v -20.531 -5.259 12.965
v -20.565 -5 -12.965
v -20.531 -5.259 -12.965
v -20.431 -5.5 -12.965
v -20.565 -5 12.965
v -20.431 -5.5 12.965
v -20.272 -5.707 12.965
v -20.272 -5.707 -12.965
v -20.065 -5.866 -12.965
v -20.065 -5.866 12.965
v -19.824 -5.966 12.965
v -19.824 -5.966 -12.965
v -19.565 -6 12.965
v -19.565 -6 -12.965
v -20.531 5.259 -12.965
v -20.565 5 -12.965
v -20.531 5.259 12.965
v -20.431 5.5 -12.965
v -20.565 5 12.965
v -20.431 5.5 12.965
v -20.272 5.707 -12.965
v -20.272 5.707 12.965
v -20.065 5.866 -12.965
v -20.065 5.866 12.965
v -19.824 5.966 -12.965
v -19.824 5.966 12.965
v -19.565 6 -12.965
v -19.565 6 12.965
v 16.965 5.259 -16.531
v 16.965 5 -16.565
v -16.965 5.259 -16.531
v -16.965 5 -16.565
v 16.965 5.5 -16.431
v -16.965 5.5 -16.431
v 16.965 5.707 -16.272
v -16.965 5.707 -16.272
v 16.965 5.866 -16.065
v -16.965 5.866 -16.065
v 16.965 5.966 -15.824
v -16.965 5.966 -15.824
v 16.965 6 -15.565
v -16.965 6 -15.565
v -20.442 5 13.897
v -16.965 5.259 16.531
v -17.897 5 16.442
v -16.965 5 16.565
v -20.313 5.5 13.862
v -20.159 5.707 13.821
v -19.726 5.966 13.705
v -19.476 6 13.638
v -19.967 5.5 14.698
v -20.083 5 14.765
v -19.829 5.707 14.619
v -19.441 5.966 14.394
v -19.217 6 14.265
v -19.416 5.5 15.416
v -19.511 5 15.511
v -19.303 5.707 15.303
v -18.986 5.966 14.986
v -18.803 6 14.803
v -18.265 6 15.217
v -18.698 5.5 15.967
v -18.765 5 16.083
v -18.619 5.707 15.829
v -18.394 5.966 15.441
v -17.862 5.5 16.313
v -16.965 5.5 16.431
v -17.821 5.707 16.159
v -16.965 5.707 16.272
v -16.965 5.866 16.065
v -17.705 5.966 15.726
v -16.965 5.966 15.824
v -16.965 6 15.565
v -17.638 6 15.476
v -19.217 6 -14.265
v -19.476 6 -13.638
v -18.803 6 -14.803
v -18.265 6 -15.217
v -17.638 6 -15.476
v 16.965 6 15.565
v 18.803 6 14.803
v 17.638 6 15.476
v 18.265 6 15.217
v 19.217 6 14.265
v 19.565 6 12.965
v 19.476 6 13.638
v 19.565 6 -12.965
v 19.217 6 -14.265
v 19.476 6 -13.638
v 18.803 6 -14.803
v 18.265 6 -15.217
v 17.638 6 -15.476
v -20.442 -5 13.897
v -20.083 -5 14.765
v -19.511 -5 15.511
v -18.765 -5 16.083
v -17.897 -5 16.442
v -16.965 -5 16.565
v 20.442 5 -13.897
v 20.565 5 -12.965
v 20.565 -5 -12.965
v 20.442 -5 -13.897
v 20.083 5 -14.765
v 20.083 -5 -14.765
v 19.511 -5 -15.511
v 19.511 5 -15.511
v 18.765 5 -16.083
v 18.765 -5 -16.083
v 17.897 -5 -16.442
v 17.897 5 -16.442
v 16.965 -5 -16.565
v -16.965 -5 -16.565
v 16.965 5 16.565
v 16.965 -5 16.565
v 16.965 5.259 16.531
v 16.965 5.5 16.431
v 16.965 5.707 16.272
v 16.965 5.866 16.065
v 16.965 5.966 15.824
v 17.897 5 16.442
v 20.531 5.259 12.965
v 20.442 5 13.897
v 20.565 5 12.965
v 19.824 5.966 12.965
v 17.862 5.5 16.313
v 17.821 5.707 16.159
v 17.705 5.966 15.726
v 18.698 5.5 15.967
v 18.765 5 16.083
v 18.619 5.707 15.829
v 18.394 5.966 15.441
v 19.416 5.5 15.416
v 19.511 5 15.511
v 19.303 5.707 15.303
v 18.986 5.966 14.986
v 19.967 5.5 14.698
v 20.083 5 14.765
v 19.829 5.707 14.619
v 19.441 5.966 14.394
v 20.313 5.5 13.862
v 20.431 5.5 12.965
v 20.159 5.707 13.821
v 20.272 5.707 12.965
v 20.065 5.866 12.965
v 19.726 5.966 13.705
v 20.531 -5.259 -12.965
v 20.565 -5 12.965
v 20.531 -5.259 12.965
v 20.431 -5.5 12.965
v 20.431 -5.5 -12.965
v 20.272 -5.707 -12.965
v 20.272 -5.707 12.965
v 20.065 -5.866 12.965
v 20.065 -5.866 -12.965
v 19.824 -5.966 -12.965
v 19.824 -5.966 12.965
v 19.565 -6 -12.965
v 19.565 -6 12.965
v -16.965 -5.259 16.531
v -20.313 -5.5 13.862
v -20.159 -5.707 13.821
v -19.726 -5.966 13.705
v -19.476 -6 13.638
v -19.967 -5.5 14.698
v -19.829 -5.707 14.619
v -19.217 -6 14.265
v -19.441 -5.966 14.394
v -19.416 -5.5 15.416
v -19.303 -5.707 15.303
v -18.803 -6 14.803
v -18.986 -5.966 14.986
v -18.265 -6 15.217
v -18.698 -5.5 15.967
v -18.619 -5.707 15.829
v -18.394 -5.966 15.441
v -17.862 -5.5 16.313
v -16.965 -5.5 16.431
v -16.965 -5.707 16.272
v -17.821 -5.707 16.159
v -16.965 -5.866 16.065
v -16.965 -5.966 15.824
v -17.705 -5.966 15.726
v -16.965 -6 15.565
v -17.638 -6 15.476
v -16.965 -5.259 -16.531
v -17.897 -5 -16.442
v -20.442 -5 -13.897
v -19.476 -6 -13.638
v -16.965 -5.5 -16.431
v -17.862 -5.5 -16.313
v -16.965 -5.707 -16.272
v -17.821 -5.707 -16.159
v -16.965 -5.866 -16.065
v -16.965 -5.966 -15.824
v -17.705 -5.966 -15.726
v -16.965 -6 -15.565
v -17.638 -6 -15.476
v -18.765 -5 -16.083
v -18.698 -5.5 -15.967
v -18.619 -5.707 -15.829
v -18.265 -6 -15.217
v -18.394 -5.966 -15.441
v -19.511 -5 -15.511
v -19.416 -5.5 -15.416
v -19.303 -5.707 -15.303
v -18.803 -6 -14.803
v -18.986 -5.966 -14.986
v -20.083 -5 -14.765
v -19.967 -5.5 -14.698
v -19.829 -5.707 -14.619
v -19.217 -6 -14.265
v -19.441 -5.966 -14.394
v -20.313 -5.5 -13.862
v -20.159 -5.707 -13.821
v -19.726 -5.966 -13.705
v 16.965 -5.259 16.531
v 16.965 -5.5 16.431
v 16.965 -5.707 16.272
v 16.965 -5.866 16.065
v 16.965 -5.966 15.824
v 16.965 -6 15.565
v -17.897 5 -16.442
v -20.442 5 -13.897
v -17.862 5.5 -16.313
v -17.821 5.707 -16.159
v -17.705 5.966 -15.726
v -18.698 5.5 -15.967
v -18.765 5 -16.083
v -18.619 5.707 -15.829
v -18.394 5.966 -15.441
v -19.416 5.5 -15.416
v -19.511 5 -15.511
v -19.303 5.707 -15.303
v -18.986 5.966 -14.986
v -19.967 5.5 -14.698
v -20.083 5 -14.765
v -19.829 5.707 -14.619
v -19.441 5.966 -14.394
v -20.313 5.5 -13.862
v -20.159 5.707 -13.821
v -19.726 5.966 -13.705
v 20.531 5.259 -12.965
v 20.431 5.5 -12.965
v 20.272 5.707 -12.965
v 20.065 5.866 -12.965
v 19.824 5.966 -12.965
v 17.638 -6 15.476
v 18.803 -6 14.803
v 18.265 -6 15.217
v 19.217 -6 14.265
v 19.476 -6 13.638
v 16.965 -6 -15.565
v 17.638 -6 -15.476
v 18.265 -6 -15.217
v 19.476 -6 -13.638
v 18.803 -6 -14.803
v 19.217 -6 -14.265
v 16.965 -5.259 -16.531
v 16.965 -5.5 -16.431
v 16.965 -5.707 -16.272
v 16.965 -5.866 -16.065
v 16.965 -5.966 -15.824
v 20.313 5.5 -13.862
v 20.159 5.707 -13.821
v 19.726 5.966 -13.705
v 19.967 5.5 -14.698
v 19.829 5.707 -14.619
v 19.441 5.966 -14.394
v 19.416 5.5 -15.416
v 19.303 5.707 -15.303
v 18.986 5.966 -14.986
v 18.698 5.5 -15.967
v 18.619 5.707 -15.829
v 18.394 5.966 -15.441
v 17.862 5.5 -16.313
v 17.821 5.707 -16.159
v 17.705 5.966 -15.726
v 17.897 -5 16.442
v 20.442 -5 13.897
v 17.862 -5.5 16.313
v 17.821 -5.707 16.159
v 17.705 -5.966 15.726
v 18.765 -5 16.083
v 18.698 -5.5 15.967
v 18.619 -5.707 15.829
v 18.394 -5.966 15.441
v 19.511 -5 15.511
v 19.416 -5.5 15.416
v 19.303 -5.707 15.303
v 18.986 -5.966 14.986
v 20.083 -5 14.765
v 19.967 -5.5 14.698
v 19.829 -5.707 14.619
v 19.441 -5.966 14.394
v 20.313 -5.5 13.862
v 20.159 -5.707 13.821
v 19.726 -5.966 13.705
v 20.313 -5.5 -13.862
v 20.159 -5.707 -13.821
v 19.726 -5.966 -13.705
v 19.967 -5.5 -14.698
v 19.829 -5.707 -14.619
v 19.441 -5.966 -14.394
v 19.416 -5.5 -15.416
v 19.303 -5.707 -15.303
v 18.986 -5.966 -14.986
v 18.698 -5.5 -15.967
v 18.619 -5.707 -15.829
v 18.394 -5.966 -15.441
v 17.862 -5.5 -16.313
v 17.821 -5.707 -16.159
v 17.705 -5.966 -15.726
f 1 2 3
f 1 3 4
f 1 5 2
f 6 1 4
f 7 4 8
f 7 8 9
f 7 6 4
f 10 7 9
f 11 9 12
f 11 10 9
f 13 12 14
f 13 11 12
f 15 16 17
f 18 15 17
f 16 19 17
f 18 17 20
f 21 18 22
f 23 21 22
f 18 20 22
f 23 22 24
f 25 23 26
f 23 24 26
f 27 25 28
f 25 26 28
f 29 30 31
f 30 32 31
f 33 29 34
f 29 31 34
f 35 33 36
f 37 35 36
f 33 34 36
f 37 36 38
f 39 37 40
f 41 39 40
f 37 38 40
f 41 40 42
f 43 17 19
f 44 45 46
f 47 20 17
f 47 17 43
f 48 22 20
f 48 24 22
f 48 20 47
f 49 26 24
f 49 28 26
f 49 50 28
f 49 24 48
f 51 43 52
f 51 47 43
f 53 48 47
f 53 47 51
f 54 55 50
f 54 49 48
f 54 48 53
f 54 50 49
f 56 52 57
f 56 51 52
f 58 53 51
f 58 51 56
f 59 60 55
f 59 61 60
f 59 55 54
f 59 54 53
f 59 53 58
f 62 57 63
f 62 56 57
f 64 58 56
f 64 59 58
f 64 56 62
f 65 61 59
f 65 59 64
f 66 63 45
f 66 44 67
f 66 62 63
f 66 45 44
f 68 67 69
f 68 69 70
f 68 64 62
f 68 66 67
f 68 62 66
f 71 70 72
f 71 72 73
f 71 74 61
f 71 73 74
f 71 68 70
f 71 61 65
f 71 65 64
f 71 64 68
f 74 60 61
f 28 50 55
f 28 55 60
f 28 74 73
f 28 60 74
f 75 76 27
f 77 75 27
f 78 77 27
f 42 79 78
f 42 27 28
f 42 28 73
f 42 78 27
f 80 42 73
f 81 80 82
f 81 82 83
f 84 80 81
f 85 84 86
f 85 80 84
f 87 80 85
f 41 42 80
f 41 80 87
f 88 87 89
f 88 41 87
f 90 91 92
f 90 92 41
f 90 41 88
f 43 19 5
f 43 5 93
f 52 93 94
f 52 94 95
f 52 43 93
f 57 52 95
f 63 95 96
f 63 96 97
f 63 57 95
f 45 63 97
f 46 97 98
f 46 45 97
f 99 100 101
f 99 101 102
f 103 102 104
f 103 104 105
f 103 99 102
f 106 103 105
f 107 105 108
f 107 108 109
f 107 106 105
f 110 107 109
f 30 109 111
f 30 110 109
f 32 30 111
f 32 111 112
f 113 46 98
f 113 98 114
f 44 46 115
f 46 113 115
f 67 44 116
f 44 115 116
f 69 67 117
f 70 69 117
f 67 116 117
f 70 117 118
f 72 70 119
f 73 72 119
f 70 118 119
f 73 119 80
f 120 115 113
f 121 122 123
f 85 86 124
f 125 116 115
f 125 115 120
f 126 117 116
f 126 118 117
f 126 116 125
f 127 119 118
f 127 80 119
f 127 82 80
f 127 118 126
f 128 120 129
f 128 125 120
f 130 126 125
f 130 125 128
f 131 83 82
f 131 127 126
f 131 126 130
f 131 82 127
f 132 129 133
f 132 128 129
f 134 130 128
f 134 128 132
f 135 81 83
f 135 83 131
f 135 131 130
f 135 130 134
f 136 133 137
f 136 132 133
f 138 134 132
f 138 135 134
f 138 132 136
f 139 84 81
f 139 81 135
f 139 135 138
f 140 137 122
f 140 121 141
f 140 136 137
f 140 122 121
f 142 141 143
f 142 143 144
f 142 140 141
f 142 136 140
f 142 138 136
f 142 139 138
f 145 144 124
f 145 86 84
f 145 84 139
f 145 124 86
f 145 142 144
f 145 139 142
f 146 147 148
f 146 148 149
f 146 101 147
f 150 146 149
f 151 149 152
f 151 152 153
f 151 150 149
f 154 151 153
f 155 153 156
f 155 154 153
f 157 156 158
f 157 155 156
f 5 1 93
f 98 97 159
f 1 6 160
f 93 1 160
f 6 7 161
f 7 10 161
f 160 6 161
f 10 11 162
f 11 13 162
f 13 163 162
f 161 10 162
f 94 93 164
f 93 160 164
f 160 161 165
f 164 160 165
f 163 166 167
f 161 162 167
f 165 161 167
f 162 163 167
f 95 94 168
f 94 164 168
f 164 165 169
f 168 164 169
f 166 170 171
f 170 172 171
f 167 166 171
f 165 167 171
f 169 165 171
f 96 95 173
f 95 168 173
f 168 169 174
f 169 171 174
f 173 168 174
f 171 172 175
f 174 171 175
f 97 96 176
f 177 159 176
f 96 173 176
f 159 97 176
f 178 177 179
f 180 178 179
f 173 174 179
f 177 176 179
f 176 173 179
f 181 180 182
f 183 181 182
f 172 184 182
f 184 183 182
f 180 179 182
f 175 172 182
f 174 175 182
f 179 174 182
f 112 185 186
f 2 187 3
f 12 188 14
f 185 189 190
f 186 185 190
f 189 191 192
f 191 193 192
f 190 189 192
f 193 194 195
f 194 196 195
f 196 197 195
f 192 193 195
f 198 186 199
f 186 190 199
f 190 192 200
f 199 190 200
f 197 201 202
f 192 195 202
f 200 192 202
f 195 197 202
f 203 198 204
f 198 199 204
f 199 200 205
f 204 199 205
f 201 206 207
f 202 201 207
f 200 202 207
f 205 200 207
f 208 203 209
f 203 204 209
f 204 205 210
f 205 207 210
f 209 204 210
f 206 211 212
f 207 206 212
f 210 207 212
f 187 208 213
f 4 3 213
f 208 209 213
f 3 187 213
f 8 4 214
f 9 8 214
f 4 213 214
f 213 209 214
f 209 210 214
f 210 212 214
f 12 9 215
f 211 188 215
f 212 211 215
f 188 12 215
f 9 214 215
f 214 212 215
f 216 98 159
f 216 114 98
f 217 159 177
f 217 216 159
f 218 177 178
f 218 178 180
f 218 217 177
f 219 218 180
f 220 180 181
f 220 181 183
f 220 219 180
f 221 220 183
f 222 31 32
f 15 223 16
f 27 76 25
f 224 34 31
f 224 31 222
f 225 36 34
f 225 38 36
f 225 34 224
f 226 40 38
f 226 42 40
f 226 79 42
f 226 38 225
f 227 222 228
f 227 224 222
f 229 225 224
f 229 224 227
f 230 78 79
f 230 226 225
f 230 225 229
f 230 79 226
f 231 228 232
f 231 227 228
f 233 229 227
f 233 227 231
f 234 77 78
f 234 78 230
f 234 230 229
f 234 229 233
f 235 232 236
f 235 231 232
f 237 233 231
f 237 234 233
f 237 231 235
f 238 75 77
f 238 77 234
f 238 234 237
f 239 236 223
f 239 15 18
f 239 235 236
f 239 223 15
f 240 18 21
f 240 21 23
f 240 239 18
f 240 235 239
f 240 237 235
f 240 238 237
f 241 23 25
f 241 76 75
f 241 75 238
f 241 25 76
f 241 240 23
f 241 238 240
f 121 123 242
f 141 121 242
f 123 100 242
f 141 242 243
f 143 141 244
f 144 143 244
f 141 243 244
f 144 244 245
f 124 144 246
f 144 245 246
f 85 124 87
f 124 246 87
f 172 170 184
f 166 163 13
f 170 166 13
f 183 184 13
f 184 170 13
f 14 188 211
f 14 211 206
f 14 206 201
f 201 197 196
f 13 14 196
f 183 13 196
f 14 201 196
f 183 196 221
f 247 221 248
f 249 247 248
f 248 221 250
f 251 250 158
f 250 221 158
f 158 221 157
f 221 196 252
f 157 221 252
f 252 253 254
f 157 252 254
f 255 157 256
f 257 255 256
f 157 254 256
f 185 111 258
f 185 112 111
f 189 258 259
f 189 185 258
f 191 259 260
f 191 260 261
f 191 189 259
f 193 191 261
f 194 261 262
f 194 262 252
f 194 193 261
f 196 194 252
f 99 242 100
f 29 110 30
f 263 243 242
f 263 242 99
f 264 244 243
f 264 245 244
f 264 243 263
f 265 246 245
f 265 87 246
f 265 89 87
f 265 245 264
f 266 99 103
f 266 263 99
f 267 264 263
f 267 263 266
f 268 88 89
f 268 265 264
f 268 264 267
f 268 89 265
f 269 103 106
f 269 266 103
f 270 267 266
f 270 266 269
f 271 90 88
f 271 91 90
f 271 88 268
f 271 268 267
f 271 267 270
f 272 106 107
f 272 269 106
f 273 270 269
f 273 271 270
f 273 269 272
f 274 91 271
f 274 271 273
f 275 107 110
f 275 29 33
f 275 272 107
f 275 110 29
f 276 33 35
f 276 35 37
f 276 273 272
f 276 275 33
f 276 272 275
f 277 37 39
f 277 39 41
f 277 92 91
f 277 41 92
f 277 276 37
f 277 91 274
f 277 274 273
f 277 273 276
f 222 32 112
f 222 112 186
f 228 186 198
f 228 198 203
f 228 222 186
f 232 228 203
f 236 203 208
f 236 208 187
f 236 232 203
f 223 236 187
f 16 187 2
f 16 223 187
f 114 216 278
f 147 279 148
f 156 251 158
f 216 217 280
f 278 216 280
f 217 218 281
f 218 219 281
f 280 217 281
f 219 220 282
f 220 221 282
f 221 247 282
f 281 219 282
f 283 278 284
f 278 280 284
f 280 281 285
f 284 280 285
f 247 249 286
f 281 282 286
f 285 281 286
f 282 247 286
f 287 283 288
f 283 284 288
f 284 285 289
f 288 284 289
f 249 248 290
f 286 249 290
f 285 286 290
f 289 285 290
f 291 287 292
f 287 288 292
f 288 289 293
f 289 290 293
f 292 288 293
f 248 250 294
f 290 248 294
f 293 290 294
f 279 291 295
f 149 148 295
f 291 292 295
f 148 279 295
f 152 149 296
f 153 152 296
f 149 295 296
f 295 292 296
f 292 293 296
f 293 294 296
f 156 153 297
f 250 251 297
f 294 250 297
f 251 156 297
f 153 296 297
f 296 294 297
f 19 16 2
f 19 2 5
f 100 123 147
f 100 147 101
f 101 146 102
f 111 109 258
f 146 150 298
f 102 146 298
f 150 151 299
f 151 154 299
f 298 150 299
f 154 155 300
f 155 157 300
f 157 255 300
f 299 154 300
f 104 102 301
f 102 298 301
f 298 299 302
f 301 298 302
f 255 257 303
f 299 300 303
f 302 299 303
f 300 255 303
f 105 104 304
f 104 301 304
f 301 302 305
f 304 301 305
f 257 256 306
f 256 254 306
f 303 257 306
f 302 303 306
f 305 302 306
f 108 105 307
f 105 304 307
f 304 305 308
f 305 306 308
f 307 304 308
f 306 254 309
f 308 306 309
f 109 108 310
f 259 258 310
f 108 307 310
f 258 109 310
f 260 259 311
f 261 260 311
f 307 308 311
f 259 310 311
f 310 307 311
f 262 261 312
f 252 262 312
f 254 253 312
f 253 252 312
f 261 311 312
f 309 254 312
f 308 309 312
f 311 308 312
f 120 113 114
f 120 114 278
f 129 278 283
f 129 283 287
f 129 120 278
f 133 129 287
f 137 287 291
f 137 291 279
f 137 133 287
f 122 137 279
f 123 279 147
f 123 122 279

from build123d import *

# Parameters (mm, degrees)
BOSS_EXTRUDE1_DEPTH = 6
FILLET1_R           = 1


with BuildPart() as part:
    # Sketch1 → Boss-Extrude1 (new body, symmetric)
    with BuildSketch(Plane(origin=(0, 0, 0), x_dir=(1, 0, 0), z_dir=(0, 1, 0))):
        with BuildLine():
            Line((-16.965, -16.565), (16.965, -16.565))
            ThreePointArc((16.965, -16.565), (19.510584412, -15.510584412), (20.565, -12.965))
            Line((20.565, -12.965), (20.565, 12.965))
            ThreePointArc((20.565, 12.965), (19.510584412, 15.510584412), (16.965, 16.565))
            Line((16.965, 16.565), (-16.965, 16.565))
            ThreePointArc((-16.965, 16.565), (-19.510584412, 15.510584412), (-20.565, 12.965))
            Line((-20.565, 12.965), (-20.565, -12.965))
            ThreePointArc((-20.565, -12.965), (-19.510584412, -15.510584412), (-16.965, -16.565))
        make_face()
    extrude(amount=BOSS_EXTRUDE1_DEPTH, both=True)

    # Fillet1
    fillet1_edges = [part.edges().sort_by_distance(p)[0] for p in [
        (0, -6, -16.565),
        (19.510584412, -6, -15.510584412),
        (20.565, -6, 0),
        (19.510584412, -6, 15.510584412),
        (19.510584412, 6, -15.510584412),
        (0, 6, -16.565),
        (-19.510584412, 6, -15.510584412),
        (-20.565, 6, 0),
        (-19.510584412, 6, 15.510584412),
        (0, 6, 16.565),
        (19.510584412, 6, 15.510584412),
        (0, -6, 16.565),
        (20.565, 6, 0),
        (-19.510584412, -6, 15.510584412),
        (-20.565, -6, 0),
        (-19.510584412, -6, -15.510584412),
    ]]
    fillet(fillet1_edges, radius=FILLET1_R)


solid = part.part
